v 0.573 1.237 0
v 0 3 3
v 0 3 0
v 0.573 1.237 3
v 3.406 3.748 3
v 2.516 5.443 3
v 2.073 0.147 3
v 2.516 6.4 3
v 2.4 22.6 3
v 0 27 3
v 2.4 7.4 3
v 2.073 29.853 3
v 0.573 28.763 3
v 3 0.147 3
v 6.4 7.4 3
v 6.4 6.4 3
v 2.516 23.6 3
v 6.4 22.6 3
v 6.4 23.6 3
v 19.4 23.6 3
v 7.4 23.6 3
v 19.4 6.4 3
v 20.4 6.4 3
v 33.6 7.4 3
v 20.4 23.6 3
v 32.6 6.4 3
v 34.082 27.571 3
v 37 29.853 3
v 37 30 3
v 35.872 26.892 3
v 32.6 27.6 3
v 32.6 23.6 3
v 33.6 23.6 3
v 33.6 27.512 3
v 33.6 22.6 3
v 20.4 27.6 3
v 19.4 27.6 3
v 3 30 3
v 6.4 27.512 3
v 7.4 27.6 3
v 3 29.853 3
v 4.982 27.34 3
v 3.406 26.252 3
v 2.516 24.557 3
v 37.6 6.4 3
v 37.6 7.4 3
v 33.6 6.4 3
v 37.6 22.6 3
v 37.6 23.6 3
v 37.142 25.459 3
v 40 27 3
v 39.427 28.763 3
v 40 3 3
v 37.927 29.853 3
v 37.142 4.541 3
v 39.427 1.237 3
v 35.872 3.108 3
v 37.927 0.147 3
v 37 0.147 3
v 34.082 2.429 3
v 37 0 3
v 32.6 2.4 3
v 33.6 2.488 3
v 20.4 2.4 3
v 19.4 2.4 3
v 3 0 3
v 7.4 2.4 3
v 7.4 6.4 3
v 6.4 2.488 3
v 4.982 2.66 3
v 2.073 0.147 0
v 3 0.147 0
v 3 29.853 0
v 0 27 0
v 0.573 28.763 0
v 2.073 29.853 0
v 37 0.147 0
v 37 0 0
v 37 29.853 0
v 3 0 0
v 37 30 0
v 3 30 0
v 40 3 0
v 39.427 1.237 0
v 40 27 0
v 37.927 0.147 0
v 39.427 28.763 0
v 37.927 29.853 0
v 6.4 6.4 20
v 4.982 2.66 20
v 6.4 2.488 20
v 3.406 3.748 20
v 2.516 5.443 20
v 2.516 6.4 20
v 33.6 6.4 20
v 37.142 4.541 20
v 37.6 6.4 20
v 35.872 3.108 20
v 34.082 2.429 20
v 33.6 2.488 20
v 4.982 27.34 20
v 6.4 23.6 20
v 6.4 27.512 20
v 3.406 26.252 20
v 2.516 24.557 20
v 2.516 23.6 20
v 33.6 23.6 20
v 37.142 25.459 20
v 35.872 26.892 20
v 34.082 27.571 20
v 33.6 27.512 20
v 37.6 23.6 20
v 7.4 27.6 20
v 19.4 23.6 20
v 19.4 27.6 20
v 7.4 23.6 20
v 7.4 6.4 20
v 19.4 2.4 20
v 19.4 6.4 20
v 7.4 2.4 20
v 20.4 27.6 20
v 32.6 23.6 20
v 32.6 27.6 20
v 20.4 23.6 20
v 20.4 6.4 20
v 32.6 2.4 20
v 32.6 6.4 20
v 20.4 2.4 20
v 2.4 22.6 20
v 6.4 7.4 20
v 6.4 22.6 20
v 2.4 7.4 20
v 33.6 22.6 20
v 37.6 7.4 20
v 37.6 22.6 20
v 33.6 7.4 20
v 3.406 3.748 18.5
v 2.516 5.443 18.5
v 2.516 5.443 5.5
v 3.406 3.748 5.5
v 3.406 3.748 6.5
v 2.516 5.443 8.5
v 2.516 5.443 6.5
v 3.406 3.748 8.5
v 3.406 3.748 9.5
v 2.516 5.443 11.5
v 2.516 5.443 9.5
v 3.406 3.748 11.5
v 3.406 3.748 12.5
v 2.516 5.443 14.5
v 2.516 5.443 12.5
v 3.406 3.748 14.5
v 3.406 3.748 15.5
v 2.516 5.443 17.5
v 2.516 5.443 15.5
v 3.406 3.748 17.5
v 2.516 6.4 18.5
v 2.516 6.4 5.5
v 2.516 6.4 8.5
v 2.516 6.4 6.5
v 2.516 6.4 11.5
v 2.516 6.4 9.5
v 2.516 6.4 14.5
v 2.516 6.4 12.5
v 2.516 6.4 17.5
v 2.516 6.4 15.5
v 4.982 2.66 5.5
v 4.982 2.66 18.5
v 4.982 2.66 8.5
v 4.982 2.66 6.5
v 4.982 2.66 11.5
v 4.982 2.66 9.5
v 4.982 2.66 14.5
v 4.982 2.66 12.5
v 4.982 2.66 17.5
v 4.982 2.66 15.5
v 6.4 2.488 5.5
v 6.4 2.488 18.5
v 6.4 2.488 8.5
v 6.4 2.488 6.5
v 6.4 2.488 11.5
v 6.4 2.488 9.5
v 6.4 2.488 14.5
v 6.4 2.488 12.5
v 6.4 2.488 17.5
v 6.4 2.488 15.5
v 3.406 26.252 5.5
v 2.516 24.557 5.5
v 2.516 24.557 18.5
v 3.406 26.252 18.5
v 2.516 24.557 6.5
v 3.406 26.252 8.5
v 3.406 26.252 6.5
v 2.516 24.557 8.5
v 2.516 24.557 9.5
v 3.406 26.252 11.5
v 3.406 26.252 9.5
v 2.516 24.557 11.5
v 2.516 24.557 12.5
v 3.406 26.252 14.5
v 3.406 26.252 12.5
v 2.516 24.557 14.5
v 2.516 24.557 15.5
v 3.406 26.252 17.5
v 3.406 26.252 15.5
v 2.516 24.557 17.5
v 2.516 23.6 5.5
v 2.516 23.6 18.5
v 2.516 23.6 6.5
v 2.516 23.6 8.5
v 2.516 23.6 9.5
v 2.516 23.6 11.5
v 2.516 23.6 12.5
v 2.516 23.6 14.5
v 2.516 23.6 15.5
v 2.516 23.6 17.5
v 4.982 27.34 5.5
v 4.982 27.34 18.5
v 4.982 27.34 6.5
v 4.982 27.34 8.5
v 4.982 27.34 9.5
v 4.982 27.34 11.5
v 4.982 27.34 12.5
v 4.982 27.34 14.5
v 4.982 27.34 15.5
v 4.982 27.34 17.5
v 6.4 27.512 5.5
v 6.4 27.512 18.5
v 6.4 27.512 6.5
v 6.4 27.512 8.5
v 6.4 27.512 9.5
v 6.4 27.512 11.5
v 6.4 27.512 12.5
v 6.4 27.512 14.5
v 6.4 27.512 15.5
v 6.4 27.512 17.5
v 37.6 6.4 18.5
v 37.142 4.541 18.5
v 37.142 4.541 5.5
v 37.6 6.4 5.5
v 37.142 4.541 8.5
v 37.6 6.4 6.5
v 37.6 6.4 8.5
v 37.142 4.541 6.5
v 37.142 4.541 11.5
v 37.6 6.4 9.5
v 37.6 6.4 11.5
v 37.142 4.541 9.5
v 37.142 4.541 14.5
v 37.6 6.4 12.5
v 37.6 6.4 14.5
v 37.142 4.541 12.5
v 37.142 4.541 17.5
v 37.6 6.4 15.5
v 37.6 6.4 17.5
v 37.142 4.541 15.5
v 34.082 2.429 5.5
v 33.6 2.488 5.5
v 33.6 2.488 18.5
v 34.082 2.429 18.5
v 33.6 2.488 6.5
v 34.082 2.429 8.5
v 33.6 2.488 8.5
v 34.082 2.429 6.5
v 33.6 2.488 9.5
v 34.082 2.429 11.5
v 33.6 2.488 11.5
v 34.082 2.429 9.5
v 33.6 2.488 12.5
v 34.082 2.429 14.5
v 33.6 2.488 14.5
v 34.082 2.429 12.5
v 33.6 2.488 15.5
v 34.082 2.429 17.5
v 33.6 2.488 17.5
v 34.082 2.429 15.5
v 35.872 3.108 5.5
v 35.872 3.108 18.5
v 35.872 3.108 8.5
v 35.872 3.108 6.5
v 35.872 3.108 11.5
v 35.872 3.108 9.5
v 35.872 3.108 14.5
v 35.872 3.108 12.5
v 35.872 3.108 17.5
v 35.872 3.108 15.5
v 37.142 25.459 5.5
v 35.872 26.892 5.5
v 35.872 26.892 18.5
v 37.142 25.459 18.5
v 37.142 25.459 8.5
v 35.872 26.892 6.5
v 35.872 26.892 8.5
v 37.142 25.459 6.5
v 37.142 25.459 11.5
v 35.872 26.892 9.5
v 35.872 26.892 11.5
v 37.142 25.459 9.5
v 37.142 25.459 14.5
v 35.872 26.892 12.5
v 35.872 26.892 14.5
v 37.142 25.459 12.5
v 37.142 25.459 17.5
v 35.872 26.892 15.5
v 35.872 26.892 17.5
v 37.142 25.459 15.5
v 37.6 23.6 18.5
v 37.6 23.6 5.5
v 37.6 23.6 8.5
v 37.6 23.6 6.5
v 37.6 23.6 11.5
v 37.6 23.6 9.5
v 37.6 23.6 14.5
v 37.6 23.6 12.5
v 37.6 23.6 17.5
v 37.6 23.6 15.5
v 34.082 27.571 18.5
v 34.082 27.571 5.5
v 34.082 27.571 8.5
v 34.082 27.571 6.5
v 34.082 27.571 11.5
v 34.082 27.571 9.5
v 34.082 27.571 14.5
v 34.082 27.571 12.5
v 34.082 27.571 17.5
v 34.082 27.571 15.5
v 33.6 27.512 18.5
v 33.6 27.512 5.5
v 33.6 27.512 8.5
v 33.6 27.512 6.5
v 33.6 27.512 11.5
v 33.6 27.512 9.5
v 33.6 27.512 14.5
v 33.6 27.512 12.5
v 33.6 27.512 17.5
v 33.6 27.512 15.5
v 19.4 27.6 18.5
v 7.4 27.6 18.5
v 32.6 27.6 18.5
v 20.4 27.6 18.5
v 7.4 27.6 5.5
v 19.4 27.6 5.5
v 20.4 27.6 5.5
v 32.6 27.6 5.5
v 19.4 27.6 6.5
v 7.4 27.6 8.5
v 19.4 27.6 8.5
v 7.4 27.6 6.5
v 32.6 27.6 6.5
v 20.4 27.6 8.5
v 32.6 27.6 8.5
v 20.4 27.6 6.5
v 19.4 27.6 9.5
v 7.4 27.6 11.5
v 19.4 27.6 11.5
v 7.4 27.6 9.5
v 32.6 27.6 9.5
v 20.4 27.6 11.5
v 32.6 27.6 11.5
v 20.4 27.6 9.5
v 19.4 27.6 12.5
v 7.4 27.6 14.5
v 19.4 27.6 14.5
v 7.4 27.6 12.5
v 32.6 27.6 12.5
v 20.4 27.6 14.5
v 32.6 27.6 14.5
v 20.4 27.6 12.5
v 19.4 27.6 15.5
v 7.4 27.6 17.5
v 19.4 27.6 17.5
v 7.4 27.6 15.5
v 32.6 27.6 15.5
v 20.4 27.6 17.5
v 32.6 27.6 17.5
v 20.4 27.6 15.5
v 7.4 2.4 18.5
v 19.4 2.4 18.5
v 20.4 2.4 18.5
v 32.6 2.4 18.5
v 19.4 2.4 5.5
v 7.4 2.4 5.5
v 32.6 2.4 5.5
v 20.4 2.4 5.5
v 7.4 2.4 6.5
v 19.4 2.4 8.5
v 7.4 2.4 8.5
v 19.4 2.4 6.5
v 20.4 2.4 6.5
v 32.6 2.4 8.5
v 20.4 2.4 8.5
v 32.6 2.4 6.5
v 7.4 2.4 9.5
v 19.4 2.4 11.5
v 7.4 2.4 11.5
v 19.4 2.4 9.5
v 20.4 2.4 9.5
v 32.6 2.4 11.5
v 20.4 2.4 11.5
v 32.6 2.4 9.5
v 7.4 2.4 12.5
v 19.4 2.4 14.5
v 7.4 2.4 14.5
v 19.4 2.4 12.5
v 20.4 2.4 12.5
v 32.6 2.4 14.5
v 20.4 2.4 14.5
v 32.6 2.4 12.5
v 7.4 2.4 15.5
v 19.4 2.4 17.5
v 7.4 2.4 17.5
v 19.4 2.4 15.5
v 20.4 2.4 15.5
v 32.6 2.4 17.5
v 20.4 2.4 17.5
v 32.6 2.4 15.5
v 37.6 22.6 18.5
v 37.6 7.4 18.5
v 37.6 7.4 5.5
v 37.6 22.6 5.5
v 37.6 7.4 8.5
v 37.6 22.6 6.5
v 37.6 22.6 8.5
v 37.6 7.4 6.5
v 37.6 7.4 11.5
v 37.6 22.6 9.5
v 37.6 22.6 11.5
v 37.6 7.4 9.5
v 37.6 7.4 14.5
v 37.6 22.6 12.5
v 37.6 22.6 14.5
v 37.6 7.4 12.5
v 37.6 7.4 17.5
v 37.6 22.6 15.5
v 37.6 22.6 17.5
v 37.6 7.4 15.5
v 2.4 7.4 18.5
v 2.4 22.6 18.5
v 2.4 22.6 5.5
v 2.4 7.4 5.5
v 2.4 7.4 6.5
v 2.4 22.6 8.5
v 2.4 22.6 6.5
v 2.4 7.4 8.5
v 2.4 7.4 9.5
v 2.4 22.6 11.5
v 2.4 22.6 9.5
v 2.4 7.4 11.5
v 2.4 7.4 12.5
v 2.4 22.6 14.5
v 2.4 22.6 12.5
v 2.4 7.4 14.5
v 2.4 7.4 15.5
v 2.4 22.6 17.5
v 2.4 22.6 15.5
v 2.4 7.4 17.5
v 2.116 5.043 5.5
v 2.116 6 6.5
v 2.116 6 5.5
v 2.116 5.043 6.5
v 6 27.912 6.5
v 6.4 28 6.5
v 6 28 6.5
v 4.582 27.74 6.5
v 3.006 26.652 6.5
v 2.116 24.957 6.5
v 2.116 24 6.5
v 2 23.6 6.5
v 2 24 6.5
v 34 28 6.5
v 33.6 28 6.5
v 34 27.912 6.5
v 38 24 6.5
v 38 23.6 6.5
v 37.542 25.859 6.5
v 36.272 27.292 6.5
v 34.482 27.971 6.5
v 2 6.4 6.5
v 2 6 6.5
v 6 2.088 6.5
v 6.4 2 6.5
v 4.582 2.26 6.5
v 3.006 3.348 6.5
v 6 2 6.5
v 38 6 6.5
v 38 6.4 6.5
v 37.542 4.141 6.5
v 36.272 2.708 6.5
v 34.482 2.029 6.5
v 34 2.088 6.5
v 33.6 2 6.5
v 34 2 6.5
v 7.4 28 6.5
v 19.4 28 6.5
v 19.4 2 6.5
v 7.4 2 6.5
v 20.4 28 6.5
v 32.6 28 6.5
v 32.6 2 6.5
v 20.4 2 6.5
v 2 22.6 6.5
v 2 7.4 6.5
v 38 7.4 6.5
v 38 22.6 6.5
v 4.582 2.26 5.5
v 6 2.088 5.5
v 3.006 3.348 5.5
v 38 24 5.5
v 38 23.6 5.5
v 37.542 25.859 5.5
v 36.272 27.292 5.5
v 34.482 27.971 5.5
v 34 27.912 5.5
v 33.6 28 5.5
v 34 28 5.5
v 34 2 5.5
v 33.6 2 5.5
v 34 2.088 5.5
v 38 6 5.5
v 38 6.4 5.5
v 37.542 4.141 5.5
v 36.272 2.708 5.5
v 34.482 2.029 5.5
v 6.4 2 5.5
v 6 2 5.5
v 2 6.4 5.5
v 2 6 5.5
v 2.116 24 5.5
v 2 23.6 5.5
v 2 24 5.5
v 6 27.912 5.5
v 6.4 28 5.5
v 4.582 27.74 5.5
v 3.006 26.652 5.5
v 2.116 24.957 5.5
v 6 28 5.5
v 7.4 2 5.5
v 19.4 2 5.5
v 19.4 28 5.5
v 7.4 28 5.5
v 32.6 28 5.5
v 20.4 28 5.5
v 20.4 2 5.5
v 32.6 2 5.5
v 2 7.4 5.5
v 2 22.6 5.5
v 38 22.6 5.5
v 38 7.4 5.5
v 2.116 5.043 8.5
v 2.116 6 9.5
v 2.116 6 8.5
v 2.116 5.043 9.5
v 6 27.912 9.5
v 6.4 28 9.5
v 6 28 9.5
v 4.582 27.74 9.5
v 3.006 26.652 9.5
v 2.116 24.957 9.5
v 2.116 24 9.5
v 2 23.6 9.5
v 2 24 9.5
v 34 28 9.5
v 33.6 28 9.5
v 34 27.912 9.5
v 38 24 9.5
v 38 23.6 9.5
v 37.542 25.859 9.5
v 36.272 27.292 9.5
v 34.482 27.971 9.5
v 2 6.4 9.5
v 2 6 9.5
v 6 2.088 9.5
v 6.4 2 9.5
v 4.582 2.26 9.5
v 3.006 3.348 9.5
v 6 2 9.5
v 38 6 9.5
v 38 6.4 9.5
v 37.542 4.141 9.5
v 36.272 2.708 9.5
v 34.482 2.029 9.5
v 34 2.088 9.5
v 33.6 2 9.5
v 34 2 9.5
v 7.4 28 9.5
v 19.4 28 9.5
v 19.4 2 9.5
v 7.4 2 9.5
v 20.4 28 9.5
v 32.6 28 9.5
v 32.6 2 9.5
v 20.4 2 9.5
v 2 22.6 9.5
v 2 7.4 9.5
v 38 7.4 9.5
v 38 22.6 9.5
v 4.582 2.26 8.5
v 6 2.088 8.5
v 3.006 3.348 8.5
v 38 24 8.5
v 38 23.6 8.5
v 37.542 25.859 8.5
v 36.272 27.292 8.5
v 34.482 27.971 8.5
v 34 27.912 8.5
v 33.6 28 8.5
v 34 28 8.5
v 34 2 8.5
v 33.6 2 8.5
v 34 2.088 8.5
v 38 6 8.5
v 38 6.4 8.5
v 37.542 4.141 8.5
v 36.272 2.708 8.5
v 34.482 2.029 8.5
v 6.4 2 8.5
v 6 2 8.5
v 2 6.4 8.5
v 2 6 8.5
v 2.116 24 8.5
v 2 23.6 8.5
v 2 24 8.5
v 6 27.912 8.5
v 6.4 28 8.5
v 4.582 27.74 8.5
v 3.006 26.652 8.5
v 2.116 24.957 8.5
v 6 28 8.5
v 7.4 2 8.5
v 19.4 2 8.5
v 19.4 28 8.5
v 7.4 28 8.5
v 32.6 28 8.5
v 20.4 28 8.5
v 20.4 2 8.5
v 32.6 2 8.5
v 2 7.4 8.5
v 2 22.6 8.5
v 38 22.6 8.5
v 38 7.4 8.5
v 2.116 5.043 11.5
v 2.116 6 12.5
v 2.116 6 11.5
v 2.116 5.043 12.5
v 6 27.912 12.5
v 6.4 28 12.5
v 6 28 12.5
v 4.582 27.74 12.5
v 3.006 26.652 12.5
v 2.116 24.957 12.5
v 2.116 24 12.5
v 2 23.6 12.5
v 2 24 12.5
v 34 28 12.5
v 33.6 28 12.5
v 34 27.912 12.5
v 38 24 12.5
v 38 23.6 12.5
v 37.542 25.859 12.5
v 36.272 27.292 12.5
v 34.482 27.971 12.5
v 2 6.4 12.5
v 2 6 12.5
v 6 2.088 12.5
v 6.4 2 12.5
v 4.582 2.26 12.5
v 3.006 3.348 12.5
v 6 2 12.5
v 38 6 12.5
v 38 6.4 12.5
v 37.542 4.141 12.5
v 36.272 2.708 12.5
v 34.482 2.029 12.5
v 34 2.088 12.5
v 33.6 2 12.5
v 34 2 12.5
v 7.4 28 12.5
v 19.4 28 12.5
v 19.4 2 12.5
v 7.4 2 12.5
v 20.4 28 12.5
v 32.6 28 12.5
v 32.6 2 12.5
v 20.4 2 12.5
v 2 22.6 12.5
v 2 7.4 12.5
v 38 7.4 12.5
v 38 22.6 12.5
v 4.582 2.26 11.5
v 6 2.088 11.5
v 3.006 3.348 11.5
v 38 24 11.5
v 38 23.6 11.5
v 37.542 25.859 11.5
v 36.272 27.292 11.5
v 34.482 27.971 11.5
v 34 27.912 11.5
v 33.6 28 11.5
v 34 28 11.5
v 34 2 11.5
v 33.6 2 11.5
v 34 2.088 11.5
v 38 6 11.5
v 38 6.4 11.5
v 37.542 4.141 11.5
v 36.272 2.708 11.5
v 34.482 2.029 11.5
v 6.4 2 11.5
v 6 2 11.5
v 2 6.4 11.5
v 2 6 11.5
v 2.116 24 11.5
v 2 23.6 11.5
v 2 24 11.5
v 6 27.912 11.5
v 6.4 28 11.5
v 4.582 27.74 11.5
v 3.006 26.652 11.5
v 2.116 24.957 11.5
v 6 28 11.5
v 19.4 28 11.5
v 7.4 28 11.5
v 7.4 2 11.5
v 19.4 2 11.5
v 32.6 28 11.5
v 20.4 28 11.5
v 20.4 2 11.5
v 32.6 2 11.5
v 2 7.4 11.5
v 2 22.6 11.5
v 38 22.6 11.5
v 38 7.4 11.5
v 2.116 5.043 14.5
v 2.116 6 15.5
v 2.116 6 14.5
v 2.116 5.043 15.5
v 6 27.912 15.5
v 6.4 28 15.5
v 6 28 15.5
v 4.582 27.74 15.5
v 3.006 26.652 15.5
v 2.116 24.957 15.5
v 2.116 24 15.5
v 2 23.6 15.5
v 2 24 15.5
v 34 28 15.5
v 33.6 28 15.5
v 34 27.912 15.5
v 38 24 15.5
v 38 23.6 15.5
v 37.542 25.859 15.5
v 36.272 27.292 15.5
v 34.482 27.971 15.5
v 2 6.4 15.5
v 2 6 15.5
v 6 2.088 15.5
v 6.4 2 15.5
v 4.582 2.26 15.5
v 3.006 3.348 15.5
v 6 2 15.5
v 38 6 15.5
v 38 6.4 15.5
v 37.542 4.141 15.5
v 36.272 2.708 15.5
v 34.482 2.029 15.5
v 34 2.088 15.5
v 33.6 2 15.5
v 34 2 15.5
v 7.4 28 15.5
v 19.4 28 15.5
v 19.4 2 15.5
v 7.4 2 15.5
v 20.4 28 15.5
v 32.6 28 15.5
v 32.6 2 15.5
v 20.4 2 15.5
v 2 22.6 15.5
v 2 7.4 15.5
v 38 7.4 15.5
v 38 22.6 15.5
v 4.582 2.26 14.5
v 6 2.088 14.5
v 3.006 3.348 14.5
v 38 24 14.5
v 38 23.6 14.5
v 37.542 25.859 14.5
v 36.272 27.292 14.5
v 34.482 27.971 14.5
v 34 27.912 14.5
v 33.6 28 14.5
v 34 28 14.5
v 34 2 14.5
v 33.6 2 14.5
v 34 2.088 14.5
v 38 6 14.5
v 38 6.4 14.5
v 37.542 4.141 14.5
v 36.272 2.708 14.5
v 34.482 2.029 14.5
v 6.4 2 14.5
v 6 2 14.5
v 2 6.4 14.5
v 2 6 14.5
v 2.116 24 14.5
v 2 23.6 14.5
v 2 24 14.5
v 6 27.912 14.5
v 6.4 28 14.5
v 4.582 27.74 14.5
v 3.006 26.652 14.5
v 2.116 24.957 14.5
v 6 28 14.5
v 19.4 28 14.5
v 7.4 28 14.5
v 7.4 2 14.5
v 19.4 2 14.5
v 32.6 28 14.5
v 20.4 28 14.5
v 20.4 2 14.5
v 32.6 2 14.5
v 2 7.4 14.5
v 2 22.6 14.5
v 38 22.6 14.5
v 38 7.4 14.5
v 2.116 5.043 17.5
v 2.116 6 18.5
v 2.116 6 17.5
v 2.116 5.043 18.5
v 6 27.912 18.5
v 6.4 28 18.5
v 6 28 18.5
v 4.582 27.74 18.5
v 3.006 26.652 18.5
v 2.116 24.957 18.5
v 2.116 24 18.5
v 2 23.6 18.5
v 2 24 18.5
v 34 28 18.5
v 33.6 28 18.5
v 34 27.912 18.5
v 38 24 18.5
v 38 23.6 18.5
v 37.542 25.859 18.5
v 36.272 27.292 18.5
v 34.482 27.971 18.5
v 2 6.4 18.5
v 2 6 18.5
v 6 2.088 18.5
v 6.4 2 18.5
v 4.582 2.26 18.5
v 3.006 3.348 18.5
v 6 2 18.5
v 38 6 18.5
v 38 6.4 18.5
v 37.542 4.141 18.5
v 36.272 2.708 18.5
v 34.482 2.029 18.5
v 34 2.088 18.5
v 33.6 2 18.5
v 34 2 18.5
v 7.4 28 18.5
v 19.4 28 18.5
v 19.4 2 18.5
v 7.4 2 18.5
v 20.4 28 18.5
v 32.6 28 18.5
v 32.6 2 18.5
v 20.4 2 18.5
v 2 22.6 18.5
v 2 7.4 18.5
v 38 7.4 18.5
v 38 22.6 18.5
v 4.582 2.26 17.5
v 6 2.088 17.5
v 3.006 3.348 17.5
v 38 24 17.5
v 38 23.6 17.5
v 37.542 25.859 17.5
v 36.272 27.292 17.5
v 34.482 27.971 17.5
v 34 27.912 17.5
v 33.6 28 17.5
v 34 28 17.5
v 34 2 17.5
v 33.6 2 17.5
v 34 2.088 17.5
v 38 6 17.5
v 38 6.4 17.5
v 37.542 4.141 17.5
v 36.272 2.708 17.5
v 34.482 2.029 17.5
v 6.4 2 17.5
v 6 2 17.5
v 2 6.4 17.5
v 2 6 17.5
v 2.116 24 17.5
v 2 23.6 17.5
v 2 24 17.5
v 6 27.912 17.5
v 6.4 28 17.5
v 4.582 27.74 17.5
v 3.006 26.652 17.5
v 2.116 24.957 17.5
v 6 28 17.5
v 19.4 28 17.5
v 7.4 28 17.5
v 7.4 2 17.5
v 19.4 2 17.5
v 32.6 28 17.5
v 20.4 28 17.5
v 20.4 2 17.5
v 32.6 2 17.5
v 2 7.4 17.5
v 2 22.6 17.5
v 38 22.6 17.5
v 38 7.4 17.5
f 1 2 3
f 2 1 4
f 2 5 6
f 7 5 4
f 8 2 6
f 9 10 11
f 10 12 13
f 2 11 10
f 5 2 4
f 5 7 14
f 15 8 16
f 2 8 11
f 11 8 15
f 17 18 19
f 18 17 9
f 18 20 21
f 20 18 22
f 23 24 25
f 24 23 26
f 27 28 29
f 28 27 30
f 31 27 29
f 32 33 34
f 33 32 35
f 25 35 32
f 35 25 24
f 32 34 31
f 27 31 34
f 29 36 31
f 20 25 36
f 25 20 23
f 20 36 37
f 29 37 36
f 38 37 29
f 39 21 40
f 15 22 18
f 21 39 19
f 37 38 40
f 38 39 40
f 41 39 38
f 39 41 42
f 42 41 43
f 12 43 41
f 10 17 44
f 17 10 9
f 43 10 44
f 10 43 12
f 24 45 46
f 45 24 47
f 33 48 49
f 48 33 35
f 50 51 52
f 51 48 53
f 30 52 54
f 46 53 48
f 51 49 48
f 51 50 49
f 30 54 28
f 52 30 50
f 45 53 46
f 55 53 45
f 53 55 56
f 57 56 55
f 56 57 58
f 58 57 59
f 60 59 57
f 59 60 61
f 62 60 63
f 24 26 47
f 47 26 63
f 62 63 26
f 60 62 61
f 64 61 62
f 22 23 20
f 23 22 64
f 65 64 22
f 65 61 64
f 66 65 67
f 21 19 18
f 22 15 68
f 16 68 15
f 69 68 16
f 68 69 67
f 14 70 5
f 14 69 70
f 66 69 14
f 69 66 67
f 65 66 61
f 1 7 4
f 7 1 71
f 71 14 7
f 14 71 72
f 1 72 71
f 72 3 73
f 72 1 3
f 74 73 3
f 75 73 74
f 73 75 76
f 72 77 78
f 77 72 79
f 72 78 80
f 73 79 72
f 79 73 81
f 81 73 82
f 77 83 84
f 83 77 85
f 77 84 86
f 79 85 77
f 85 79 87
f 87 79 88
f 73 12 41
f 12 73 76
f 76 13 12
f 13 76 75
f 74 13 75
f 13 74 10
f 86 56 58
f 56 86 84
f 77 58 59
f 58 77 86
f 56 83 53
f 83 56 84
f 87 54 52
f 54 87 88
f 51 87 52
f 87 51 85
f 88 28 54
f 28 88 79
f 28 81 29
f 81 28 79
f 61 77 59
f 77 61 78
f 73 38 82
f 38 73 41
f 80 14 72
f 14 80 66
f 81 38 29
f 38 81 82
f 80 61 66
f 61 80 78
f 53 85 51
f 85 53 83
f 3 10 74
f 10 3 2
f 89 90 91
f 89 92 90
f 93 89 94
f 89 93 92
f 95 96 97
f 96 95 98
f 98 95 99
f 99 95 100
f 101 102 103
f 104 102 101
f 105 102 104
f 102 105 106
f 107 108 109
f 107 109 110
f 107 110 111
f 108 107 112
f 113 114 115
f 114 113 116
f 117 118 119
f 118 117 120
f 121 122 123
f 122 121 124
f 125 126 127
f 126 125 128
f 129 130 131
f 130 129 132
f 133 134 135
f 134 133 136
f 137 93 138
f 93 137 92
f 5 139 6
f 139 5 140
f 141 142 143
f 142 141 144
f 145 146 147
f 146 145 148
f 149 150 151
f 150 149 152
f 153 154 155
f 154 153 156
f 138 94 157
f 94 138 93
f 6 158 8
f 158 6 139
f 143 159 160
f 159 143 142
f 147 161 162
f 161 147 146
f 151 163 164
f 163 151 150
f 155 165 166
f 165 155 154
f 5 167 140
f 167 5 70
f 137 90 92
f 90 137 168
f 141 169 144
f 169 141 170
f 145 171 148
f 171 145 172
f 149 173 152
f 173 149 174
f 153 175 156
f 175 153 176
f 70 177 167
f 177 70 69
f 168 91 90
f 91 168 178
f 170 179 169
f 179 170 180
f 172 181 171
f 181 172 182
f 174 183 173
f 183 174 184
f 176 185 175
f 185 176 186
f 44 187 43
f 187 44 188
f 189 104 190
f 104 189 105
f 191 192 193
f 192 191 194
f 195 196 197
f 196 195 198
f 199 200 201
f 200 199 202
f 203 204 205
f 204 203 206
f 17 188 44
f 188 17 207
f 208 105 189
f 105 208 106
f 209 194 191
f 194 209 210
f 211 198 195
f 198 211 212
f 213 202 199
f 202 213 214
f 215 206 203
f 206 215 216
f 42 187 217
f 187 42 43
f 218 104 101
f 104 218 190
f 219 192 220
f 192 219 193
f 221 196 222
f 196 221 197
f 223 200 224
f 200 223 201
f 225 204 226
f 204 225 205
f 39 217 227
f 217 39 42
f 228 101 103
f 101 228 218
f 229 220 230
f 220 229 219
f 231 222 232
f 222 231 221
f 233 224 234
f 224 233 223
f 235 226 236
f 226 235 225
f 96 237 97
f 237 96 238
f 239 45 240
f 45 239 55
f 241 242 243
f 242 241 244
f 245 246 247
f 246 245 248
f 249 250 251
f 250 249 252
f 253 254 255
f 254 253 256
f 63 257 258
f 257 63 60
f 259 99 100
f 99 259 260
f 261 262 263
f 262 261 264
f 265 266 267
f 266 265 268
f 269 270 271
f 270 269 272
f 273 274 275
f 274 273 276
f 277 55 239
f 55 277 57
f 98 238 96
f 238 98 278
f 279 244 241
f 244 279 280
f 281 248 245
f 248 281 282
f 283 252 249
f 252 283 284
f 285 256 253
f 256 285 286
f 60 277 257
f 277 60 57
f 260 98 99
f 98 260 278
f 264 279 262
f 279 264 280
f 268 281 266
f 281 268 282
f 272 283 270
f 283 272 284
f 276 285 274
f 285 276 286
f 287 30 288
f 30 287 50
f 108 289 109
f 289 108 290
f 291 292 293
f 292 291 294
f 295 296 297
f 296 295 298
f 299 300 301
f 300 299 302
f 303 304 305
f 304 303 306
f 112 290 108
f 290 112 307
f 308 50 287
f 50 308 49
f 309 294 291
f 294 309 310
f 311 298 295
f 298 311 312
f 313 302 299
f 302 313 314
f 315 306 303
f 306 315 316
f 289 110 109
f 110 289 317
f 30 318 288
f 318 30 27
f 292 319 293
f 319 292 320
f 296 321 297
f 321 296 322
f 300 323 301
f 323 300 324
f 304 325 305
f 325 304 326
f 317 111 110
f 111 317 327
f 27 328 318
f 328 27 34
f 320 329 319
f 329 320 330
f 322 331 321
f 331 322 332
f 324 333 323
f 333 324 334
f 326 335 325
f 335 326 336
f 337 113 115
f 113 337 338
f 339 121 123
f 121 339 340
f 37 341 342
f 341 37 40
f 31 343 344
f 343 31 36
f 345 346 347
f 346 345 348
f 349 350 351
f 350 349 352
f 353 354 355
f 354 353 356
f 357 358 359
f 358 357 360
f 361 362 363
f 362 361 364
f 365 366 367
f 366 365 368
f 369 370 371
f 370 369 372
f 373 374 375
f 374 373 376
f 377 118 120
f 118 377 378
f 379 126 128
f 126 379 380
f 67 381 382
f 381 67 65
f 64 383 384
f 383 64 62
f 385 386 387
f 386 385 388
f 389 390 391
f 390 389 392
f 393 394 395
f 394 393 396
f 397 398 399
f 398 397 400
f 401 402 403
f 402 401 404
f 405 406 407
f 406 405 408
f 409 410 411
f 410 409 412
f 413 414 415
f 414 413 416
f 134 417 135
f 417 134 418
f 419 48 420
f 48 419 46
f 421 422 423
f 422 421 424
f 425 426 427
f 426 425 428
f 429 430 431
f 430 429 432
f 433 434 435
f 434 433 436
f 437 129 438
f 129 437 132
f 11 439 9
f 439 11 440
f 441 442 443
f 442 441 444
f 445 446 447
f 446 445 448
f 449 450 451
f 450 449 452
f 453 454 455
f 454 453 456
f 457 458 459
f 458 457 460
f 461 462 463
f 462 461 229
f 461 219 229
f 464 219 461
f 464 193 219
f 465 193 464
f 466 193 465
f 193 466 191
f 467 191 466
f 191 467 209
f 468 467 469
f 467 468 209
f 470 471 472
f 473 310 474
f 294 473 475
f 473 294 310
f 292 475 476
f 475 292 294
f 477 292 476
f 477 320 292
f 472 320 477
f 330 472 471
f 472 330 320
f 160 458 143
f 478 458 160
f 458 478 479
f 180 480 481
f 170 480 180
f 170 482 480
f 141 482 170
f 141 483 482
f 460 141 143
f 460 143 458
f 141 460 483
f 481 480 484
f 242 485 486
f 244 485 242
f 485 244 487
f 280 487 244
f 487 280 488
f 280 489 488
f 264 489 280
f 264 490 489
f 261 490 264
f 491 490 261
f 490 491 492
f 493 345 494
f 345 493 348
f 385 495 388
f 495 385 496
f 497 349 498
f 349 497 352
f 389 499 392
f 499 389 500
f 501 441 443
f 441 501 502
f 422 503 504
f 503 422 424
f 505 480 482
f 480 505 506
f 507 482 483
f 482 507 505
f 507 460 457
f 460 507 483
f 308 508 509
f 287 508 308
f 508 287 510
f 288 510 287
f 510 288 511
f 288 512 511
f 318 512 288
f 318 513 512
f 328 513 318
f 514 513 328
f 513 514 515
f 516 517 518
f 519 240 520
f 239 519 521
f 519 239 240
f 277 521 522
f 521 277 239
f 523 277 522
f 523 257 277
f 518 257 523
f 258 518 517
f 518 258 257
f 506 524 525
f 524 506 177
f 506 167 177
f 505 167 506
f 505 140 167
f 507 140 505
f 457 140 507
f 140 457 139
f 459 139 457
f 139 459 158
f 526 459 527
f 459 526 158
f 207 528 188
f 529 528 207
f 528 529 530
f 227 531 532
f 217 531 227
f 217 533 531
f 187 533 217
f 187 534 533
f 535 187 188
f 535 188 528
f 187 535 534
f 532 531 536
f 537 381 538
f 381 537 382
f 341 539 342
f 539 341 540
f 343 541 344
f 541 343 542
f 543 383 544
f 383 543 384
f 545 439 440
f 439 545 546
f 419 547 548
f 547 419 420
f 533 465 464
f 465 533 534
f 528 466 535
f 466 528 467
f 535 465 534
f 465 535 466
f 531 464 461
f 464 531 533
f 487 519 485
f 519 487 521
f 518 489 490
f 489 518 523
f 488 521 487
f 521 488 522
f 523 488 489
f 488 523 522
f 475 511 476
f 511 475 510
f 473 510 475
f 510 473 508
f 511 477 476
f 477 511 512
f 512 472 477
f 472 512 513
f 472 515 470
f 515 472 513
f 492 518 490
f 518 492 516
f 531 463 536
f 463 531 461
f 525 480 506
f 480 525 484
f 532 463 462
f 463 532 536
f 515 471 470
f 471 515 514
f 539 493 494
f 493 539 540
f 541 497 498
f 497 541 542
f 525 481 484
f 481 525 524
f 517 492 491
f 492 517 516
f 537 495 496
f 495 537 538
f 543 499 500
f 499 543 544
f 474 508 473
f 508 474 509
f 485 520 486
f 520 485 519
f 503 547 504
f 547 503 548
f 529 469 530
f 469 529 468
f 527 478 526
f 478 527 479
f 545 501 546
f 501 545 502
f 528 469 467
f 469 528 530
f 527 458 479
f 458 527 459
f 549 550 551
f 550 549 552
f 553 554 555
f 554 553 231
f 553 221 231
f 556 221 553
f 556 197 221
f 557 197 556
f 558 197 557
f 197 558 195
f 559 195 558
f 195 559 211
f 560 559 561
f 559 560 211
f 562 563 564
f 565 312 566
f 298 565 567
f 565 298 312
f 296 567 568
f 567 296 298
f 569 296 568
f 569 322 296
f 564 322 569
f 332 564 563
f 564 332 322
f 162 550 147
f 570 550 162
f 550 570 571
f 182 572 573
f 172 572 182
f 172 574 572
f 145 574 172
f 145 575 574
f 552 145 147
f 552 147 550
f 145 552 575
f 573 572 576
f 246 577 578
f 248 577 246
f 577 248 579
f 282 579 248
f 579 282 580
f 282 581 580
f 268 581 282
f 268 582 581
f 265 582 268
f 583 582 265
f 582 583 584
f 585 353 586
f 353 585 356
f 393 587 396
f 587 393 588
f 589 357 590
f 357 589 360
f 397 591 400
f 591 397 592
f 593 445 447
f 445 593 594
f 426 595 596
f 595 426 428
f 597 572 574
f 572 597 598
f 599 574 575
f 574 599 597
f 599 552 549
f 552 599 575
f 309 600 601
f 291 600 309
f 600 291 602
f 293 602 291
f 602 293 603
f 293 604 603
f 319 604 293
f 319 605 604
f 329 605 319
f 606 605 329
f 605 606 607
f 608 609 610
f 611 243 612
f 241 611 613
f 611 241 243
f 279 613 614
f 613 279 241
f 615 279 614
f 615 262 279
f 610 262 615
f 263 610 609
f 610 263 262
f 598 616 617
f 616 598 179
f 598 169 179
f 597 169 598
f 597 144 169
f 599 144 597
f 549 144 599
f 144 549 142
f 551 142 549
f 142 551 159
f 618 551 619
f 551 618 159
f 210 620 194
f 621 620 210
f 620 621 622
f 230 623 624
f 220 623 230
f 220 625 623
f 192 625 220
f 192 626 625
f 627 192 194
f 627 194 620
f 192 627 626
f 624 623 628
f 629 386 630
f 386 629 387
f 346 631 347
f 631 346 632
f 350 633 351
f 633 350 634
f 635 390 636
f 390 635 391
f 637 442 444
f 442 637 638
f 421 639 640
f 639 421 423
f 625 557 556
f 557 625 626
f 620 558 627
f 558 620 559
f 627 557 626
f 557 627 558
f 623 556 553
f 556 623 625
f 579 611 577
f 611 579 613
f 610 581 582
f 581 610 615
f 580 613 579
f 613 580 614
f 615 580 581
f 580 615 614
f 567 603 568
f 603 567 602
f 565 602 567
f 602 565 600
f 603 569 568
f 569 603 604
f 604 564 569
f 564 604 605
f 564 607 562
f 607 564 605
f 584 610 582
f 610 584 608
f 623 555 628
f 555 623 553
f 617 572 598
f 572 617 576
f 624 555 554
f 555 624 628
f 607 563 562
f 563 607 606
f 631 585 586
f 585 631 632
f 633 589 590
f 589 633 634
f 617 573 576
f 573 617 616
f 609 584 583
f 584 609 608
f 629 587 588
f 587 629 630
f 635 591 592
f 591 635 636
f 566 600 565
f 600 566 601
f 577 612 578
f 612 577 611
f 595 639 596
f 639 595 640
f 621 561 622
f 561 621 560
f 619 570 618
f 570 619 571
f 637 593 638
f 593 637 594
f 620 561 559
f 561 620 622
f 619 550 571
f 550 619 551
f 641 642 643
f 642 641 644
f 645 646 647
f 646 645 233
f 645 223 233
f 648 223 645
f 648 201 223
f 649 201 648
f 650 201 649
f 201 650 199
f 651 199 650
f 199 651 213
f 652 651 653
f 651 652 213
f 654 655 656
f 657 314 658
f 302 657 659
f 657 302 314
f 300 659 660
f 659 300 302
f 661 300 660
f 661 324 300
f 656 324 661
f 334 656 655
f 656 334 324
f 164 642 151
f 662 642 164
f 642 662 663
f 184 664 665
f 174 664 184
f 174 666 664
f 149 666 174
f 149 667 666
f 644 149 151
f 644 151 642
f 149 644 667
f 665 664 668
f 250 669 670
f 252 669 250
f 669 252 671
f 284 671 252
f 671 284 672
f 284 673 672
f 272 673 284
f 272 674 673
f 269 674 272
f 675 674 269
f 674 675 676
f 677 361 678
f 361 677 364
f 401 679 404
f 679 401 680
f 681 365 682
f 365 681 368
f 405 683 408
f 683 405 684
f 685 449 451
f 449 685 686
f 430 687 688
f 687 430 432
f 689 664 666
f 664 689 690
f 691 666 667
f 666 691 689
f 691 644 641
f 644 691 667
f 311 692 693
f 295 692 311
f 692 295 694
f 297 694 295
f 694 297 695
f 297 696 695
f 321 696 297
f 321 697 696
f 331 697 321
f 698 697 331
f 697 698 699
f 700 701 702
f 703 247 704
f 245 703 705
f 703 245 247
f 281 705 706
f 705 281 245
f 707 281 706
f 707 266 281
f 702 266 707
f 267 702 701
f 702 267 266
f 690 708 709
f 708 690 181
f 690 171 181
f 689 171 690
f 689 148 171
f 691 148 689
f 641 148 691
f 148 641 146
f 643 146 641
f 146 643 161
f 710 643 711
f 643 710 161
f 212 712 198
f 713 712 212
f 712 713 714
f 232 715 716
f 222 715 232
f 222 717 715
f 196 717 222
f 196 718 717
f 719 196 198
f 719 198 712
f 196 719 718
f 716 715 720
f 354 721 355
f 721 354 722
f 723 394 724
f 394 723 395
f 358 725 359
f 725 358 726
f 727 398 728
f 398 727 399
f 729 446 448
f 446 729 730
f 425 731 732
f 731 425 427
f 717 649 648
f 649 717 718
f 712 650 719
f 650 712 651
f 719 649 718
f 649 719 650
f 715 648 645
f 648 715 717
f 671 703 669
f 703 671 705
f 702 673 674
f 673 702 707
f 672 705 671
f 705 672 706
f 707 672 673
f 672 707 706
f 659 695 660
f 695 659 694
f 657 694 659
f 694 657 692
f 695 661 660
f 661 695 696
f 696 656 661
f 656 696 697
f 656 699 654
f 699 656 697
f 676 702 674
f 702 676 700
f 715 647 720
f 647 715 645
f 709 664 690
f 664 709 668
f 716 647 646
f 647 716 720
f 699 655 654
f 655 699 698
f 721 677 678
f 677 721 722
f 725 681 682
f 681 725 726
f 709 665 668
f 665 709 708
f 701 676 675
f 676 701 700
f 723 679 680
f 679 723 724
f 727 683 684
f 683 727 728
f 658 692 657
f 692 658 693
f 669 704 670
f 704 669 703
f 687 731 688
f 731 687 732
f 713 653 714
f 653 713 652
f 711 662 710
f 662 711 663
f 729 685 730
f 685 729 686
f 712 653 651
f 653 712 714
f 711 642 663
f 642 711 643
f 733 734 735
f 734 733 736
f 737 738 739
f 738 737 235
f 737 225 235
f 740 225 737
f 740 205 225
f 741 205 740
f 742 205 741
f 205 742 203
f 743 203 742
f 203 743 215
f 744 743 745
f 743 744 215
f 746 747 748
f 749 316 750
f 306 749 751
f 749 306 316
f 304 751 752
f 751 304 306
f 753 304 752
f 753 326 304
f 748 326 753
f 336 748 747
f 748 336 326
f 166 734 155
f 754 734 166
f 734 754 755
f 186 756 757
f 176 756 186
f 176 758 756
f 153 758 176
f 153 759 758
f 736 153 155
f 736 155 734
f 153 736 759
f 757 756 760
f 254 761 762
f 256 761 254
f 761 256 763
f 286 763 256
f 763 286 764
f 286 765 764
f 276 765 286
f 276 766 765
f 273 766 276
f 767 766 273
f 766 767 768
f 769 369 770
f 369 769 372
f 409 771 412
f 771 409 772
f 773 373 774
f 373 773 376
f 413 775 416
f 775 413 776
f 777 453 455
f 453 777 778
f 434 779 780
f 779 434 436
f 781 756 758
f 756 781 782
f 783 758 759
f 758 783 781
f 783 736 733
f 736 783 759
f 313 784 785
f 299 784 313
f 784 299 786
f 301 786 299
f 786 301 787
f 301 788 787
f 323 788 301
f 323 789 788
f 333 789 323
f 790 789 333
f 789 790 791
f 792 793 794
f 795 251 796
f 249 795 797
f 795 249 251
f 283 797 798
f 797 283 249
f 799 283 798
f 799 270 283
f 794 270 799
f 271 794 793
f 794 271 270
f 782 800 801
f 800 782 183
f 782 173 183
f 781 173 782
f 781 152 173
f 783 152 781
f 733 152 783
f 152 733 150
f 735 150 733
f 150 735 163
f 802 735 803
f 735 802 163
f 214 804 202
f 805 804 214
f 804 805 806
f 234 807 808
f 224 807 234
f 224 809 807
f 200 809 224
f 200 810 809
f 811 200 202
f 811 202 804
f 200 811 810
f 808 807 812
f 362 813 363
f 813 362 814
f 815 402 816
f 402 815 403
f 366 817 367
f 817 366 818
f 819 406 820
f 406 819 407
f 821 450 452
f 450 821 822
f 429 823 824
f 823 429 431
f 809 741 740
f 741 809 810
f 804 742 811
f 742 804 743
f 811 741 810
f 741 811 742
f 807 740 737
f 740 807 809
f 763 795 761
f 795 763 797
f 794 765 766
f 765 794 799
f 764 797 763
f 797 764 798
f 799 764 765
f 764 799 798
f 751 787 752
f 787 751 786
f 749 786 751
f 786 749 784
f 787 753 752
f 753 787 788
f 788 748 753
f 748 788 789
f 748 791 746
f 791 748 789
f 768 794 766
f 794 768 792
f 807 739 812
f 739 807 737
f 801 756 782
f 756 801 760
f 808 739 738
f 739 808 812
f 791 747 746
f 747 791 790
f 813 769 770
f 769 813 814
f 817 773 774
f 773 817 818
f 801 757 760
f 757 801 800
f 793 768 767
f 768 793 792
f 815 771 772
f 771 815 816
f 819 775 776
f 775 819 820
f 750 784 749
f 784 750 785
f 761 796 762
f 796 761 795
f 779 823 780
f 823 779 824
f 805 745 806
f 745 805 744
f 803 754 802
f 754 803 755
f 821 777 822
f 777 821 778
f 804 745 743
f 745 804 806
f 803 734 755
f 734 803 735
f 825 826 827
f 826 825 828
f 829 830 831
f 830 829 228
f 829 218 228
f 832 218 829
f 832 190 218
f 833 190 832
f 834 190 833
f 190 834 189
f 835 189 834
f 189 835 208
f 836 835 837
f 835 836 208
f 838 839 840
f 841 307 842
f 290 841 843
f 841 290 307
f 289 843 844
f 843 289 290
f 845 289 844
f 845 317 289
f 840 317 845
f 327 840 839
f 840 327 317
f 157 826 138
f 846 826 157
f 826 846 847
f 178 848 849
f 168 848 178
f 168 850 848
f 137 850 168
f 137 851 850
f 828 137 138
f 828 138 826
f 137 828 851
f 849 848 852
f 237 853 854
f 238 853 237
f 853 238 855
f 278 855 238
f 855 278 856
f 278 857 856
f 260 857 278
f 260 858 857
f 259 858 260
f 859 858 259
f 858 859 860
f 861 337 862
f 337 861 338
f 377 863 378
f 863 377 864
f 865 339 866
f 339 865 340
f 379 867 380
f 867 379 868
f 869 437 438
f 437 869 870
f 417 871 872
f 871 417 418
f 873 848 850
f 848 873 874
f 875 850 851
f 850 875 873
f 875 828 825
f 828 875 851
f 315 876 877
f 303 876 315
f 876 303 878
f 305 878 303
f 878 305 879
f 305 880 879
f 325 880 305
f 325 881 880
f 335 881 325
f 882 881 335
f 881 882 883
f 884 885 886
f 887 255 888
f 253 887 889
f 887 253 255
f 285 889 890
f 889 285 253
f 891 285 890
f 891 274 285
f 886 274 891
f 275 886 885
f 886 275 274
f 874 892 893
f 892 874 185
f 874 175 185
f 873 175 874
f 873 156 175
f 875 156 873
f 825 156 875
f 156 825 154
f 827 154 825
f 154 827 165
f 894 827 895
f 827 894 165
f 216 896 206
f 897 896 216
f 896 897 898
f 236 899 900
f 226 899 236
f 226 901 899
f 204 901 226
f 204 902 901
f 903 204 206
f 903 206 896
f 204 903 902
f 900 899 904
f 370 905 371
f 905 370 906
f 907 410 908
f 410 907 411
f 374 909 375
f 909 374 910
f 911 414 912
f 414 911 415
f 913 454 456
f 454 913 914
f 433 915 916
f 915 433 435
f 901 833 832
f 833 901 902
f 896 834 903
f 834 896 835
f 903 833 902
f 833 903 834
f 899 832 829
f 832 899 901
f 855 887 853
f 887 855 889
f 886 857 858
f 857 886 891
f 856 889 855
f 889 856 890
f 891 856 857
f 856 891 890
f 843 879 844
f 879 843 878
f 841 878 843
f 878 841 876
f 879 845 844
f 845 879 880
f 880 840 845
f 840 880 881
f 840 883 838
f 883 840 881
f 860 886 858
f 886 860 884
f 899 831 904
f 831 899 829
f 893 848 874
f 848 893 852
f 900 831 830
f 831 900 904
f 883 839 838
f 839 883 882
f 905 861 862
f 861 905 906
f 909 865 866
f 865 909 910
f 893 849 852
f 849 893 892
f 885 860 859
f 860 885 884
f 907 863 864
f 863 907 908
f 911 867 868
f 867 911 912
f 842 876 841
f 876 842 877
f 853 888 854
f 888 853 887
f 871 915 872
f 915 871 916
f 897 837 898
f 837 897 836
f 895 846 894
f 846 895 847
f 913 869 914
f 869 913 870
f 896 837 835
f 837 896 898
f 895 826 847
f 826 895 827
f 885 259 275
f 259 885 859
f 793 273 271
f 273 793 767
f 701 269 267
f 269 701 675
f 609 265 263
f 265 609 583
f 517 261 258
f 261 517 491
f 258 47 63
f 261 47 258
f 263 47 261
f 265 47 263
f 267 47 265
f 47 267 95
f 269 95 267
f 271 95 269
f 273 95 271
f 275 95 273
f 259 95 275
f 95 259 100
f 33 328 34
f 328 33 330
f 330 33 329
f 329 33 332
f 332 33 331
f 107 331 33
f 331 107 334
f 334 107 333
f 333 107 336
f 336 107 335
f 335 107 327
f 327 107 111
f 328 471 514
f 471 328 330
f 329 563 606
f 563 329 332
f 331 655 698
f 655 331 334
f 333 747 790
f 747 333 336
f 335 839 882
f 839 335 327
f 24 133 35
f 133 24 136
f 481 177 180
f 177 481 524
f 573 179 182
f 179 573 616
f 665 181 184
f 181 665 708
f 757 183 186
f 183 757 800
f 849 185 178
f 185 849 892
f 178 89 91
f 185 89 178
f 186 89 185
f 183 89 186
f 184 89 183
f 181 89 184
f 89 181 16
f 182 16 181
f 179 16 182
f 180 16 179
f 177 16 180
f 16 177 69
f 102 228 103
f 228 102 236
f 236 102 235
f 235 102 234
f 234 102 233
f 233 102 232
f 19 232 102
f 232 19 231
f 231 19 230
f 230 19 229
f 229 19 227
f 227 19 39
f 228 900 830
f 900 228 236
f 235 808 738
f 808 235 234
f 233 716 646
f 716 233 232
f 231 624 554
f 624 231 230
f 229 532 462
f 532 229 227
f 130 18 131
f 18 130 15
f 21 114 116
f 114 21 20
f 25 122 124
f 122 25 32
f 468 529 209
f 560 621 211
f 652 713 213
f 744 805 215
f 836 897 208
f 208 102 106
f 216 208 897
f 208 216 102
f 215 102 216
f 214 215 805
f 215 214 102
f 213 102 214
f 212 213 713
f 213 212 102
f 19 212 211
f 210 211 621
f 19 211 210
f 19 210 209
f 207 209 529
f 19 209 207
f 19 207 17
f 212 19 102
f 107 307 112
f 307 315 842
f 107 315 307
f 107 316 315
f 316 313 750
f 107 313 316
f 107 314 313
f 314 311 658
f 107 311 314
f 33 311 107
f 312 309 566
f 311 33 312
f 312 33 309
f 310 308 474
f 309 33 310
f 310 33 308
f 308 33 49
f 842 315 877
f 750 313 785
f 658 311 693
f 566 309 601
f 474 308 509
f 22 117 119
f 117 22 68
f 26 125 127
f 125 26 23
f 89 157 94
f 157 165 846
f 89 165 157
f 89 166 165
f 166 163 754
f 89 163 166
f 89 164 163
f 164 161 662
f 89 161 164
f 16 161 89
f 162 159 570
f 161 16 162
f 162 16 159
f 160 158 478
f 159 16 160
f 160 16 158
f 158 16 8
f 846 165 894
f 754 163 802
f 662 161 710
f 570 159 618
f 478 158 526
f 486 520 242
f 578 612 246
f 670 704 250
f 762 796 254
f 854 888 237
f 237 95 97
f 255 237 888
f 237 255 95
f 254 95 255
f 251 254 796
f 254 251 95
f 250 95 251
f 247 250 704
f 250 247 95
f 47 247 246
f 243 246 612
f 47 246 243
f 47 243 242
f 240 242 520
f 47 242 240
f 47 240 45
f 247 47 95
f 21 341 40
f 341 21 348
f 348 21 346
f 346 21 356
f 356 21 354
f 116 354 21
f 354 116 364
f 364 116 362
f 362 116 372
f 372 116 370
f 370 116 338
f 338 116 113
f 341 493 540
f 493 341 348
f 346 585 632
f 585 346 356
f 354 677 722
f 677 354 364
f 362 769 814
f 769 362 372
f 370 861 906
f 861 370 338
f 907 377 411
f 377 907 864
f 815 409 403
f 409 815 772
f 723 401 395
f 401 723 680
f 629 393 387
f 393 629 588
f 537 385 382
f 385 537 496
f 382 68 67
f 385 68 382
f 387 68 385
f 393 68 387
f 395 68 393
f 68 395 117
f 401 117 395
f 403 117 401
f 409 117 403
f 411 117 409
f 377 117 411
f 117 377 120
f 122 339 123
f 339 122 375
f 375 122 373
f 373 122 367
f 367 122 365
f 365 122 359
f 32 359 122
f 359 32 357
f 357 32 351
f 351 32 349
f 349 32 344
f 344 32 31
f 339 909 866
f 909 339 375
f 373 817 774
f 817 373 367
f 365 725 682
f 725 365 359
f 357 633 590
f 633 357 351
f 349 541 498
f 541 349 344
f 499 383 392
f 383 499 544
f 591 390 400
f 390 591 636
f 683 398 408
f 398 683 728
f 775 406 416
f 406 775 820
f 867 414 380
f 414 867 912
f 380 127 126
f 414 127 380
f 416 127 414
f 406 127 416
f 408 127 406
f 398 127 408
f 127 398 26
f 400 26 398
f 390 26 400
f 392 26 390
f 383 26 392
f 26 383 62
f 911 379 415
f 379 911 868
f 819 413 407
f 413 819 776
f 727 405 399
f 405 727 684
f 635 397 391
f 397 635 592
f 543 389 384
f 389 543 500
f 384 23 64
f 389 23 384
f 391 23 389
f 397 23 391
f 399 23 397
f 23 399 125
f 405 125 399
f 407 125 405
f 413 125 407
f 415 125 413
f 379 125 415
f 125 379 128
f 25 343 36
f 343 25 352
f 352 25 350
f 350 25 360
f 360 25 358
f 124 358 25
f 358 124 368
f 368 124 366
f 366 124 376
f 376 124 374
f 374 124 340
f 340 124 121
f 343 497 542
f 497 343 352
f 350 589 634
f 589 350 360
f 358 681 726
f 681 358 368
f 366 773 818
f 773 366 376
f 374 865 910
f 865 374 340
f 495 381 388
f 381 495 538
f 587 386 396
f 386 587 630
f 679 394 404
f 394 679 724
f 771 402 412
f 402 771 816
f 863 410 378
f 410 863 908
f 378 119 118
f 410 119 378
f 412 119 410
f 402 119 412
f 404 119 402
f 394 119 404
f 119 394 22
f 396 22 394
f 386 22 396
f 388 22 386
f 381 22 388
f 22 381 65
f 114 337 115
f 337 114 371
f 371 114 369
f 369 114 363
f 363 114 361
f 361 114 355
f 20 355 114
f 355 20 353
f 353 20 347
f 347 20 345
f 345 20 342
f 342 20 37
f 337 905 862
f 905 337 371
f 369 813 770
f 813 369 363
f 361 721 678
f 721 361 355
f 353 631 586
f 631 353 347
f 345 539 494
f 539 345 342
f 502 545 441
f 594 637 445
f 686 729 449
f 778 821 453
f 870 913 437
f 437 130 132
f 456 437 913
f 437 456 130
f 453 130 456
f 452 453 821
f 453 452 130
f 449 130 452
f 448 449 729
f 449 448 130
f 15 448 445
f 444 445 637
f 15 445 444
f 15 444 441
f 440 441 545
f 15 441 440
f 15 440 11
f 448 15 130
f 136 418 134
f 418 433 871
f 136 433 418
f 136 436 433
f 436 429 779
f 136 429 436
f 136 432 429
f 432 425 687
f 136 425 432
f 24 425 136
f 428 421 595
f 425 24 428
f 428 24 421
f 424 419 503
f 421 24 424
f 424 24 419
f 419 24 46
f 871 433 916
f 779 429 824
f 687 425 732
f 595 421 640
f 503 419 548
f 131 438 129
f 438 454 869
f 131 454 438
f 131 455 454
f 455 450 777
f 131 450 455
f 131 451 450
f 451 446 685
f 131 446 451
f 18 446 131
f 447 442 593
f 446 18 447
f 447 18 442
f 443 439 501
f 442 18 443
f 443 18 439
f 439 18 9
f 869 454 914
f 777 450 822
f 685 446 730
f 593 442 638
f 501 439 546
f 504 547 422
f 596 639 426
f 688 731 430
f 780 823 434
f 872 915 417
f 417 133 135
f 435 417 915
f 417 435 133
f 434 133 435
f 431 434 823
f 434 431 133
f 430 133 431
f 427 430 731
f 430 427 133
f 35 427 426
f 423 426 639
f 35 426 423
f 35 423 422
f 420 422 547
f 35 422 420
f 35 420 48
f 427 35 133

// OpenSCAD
width=40;

width=40;
depth=30;
height=3;

plugHeight=17;
plugWall=4;
plugRound=4;
tolerance=0.4;
wall=2;
round=3;
plugDistance=3;
plugDistanceHeight=1;

plugWallSpacer=1;
minWallBlock=15;

/* [Hidden] */

plugWidth=width-(2*(wall+tolerance));
plugDepth=depth-(2*(wall+tolerance));

plugWidthReal=width-(2*(wall));
plugDepthReal=depth-(2*(wall));

module cap(){	
	translate([width/2,depth/2,height/2]){
		roundedBox([width,depth,height], round, true);		
	}
	
	translate([(wall+tolerance),(wall+tolerance),height]){
		difference(){
			translate([plugWidth/2,plugDepth/2,plugHeight/2]){
				roundedBox([plugWidth,plugDepth,plugHeight], plugRound, true);
				
				for(move= [1:plugHeight/plugDistance]){
					translate([0,0,move*plugDistance-plugHeight/2]){
						roundedBox([plugWidthReal,plugDepthReal,plugDistanceHeight], plugRound, true);
					}
				}
			}
			
			translate([plugWall,plugWall,0])cube([plugWidth-(2*plugWall),plugDepth-2*plugWall,plugHeight], center=false);
			translate([plugWall,-tolerance-5,0])cube([plugWallSpacer,plugDepth+10,plugHeight], center=false);	
			translate([plugWidth-plugWall-plugWallSpacer,-tolerance-5,0])cube([plugWallSpacer,plugDepth+10,plugHeight], center=false);
			
			if((plugWidthReal/2)>minWallBlock){
				translate([plugWidthReal/2-plugWallSpacer,-tolerance-5,0])cube([plugWallSpacer,plugDepthReal+10,plugHeight], center=false);
			}
			
			translate([-tolerance-5,plugWall,0])cube([plugWidth+10,plugWallSpacer,plugHeight], center=false);	
			translate([-tolerance-5,plugDepth-plugWall-plugWallSpacer,0])cube([plugWidth+10,plugWallSpacer,plugHeight], center=false);	
			
			if((plugDepthReal/2)>minWallBlock){
				translate([-tolerance-5,plugDepthReal/2-plugWallSpacer,0])cube([plugWidthReal+10,plugWallSpacer,plugHeight], center=false);	
			}
			
		}
				
	}

}

/*
 * roundedBox([width, height, depth], float radius, bool sidesonly);
 * EXAMPLE USAGE:
 * roundedBox([20, 30, 40], 5, true);
 * */
module roundedBox(size, radius, sidesonly)
{
	rot = [ [0,0,0], [90,0,90], [90,90,0] ];
	if (sidesonly){
		cube(size - [2*radius,0,0], true);
		cube(size - [0,2*radius,0], true);
		for (x = [radius-size[0]/2, -radius+size[0]/2], y = [radius-size[1]/2, -radius+size[1]/2]){
			translate([x,y,0]){
				cylinder(r=radius, h=size[2], center=true);
			}
		}
	}
	else {
		cube([size[0], size[1]-radius*2, size[2]-radius*2], center=true);
		cube([size[0]-radius*2, size[1], size[2]-radius*2], center=true);
		cube([size[0]-radius*2, size[1]-radius*2, size[2]], center=true);
		for (axis = [0:2]) {
			for (x = [radius-size[axis]/2, -radius+size[axis]/2], y = [radius-size[(axis+1)%3]/2, -radius+size[(axis+1)%3]/2]){
				rotate(rot[axis]){
					translate([x,y,0]){
						cylinder(h=size[(axis+2)%3]-2*radius, r=radius, center=true);
					}
				}
			}
		}
		for (x = [radius-size[0]/2, -radius+size[0]/2], y = [radius-size[1]/2, -radius+size[1]/2], z = [radius-size[2]/2, -radius+size[2]/2]){
			translate([x,y,z]) sphere(radius);
		}
	}
}

cap();
